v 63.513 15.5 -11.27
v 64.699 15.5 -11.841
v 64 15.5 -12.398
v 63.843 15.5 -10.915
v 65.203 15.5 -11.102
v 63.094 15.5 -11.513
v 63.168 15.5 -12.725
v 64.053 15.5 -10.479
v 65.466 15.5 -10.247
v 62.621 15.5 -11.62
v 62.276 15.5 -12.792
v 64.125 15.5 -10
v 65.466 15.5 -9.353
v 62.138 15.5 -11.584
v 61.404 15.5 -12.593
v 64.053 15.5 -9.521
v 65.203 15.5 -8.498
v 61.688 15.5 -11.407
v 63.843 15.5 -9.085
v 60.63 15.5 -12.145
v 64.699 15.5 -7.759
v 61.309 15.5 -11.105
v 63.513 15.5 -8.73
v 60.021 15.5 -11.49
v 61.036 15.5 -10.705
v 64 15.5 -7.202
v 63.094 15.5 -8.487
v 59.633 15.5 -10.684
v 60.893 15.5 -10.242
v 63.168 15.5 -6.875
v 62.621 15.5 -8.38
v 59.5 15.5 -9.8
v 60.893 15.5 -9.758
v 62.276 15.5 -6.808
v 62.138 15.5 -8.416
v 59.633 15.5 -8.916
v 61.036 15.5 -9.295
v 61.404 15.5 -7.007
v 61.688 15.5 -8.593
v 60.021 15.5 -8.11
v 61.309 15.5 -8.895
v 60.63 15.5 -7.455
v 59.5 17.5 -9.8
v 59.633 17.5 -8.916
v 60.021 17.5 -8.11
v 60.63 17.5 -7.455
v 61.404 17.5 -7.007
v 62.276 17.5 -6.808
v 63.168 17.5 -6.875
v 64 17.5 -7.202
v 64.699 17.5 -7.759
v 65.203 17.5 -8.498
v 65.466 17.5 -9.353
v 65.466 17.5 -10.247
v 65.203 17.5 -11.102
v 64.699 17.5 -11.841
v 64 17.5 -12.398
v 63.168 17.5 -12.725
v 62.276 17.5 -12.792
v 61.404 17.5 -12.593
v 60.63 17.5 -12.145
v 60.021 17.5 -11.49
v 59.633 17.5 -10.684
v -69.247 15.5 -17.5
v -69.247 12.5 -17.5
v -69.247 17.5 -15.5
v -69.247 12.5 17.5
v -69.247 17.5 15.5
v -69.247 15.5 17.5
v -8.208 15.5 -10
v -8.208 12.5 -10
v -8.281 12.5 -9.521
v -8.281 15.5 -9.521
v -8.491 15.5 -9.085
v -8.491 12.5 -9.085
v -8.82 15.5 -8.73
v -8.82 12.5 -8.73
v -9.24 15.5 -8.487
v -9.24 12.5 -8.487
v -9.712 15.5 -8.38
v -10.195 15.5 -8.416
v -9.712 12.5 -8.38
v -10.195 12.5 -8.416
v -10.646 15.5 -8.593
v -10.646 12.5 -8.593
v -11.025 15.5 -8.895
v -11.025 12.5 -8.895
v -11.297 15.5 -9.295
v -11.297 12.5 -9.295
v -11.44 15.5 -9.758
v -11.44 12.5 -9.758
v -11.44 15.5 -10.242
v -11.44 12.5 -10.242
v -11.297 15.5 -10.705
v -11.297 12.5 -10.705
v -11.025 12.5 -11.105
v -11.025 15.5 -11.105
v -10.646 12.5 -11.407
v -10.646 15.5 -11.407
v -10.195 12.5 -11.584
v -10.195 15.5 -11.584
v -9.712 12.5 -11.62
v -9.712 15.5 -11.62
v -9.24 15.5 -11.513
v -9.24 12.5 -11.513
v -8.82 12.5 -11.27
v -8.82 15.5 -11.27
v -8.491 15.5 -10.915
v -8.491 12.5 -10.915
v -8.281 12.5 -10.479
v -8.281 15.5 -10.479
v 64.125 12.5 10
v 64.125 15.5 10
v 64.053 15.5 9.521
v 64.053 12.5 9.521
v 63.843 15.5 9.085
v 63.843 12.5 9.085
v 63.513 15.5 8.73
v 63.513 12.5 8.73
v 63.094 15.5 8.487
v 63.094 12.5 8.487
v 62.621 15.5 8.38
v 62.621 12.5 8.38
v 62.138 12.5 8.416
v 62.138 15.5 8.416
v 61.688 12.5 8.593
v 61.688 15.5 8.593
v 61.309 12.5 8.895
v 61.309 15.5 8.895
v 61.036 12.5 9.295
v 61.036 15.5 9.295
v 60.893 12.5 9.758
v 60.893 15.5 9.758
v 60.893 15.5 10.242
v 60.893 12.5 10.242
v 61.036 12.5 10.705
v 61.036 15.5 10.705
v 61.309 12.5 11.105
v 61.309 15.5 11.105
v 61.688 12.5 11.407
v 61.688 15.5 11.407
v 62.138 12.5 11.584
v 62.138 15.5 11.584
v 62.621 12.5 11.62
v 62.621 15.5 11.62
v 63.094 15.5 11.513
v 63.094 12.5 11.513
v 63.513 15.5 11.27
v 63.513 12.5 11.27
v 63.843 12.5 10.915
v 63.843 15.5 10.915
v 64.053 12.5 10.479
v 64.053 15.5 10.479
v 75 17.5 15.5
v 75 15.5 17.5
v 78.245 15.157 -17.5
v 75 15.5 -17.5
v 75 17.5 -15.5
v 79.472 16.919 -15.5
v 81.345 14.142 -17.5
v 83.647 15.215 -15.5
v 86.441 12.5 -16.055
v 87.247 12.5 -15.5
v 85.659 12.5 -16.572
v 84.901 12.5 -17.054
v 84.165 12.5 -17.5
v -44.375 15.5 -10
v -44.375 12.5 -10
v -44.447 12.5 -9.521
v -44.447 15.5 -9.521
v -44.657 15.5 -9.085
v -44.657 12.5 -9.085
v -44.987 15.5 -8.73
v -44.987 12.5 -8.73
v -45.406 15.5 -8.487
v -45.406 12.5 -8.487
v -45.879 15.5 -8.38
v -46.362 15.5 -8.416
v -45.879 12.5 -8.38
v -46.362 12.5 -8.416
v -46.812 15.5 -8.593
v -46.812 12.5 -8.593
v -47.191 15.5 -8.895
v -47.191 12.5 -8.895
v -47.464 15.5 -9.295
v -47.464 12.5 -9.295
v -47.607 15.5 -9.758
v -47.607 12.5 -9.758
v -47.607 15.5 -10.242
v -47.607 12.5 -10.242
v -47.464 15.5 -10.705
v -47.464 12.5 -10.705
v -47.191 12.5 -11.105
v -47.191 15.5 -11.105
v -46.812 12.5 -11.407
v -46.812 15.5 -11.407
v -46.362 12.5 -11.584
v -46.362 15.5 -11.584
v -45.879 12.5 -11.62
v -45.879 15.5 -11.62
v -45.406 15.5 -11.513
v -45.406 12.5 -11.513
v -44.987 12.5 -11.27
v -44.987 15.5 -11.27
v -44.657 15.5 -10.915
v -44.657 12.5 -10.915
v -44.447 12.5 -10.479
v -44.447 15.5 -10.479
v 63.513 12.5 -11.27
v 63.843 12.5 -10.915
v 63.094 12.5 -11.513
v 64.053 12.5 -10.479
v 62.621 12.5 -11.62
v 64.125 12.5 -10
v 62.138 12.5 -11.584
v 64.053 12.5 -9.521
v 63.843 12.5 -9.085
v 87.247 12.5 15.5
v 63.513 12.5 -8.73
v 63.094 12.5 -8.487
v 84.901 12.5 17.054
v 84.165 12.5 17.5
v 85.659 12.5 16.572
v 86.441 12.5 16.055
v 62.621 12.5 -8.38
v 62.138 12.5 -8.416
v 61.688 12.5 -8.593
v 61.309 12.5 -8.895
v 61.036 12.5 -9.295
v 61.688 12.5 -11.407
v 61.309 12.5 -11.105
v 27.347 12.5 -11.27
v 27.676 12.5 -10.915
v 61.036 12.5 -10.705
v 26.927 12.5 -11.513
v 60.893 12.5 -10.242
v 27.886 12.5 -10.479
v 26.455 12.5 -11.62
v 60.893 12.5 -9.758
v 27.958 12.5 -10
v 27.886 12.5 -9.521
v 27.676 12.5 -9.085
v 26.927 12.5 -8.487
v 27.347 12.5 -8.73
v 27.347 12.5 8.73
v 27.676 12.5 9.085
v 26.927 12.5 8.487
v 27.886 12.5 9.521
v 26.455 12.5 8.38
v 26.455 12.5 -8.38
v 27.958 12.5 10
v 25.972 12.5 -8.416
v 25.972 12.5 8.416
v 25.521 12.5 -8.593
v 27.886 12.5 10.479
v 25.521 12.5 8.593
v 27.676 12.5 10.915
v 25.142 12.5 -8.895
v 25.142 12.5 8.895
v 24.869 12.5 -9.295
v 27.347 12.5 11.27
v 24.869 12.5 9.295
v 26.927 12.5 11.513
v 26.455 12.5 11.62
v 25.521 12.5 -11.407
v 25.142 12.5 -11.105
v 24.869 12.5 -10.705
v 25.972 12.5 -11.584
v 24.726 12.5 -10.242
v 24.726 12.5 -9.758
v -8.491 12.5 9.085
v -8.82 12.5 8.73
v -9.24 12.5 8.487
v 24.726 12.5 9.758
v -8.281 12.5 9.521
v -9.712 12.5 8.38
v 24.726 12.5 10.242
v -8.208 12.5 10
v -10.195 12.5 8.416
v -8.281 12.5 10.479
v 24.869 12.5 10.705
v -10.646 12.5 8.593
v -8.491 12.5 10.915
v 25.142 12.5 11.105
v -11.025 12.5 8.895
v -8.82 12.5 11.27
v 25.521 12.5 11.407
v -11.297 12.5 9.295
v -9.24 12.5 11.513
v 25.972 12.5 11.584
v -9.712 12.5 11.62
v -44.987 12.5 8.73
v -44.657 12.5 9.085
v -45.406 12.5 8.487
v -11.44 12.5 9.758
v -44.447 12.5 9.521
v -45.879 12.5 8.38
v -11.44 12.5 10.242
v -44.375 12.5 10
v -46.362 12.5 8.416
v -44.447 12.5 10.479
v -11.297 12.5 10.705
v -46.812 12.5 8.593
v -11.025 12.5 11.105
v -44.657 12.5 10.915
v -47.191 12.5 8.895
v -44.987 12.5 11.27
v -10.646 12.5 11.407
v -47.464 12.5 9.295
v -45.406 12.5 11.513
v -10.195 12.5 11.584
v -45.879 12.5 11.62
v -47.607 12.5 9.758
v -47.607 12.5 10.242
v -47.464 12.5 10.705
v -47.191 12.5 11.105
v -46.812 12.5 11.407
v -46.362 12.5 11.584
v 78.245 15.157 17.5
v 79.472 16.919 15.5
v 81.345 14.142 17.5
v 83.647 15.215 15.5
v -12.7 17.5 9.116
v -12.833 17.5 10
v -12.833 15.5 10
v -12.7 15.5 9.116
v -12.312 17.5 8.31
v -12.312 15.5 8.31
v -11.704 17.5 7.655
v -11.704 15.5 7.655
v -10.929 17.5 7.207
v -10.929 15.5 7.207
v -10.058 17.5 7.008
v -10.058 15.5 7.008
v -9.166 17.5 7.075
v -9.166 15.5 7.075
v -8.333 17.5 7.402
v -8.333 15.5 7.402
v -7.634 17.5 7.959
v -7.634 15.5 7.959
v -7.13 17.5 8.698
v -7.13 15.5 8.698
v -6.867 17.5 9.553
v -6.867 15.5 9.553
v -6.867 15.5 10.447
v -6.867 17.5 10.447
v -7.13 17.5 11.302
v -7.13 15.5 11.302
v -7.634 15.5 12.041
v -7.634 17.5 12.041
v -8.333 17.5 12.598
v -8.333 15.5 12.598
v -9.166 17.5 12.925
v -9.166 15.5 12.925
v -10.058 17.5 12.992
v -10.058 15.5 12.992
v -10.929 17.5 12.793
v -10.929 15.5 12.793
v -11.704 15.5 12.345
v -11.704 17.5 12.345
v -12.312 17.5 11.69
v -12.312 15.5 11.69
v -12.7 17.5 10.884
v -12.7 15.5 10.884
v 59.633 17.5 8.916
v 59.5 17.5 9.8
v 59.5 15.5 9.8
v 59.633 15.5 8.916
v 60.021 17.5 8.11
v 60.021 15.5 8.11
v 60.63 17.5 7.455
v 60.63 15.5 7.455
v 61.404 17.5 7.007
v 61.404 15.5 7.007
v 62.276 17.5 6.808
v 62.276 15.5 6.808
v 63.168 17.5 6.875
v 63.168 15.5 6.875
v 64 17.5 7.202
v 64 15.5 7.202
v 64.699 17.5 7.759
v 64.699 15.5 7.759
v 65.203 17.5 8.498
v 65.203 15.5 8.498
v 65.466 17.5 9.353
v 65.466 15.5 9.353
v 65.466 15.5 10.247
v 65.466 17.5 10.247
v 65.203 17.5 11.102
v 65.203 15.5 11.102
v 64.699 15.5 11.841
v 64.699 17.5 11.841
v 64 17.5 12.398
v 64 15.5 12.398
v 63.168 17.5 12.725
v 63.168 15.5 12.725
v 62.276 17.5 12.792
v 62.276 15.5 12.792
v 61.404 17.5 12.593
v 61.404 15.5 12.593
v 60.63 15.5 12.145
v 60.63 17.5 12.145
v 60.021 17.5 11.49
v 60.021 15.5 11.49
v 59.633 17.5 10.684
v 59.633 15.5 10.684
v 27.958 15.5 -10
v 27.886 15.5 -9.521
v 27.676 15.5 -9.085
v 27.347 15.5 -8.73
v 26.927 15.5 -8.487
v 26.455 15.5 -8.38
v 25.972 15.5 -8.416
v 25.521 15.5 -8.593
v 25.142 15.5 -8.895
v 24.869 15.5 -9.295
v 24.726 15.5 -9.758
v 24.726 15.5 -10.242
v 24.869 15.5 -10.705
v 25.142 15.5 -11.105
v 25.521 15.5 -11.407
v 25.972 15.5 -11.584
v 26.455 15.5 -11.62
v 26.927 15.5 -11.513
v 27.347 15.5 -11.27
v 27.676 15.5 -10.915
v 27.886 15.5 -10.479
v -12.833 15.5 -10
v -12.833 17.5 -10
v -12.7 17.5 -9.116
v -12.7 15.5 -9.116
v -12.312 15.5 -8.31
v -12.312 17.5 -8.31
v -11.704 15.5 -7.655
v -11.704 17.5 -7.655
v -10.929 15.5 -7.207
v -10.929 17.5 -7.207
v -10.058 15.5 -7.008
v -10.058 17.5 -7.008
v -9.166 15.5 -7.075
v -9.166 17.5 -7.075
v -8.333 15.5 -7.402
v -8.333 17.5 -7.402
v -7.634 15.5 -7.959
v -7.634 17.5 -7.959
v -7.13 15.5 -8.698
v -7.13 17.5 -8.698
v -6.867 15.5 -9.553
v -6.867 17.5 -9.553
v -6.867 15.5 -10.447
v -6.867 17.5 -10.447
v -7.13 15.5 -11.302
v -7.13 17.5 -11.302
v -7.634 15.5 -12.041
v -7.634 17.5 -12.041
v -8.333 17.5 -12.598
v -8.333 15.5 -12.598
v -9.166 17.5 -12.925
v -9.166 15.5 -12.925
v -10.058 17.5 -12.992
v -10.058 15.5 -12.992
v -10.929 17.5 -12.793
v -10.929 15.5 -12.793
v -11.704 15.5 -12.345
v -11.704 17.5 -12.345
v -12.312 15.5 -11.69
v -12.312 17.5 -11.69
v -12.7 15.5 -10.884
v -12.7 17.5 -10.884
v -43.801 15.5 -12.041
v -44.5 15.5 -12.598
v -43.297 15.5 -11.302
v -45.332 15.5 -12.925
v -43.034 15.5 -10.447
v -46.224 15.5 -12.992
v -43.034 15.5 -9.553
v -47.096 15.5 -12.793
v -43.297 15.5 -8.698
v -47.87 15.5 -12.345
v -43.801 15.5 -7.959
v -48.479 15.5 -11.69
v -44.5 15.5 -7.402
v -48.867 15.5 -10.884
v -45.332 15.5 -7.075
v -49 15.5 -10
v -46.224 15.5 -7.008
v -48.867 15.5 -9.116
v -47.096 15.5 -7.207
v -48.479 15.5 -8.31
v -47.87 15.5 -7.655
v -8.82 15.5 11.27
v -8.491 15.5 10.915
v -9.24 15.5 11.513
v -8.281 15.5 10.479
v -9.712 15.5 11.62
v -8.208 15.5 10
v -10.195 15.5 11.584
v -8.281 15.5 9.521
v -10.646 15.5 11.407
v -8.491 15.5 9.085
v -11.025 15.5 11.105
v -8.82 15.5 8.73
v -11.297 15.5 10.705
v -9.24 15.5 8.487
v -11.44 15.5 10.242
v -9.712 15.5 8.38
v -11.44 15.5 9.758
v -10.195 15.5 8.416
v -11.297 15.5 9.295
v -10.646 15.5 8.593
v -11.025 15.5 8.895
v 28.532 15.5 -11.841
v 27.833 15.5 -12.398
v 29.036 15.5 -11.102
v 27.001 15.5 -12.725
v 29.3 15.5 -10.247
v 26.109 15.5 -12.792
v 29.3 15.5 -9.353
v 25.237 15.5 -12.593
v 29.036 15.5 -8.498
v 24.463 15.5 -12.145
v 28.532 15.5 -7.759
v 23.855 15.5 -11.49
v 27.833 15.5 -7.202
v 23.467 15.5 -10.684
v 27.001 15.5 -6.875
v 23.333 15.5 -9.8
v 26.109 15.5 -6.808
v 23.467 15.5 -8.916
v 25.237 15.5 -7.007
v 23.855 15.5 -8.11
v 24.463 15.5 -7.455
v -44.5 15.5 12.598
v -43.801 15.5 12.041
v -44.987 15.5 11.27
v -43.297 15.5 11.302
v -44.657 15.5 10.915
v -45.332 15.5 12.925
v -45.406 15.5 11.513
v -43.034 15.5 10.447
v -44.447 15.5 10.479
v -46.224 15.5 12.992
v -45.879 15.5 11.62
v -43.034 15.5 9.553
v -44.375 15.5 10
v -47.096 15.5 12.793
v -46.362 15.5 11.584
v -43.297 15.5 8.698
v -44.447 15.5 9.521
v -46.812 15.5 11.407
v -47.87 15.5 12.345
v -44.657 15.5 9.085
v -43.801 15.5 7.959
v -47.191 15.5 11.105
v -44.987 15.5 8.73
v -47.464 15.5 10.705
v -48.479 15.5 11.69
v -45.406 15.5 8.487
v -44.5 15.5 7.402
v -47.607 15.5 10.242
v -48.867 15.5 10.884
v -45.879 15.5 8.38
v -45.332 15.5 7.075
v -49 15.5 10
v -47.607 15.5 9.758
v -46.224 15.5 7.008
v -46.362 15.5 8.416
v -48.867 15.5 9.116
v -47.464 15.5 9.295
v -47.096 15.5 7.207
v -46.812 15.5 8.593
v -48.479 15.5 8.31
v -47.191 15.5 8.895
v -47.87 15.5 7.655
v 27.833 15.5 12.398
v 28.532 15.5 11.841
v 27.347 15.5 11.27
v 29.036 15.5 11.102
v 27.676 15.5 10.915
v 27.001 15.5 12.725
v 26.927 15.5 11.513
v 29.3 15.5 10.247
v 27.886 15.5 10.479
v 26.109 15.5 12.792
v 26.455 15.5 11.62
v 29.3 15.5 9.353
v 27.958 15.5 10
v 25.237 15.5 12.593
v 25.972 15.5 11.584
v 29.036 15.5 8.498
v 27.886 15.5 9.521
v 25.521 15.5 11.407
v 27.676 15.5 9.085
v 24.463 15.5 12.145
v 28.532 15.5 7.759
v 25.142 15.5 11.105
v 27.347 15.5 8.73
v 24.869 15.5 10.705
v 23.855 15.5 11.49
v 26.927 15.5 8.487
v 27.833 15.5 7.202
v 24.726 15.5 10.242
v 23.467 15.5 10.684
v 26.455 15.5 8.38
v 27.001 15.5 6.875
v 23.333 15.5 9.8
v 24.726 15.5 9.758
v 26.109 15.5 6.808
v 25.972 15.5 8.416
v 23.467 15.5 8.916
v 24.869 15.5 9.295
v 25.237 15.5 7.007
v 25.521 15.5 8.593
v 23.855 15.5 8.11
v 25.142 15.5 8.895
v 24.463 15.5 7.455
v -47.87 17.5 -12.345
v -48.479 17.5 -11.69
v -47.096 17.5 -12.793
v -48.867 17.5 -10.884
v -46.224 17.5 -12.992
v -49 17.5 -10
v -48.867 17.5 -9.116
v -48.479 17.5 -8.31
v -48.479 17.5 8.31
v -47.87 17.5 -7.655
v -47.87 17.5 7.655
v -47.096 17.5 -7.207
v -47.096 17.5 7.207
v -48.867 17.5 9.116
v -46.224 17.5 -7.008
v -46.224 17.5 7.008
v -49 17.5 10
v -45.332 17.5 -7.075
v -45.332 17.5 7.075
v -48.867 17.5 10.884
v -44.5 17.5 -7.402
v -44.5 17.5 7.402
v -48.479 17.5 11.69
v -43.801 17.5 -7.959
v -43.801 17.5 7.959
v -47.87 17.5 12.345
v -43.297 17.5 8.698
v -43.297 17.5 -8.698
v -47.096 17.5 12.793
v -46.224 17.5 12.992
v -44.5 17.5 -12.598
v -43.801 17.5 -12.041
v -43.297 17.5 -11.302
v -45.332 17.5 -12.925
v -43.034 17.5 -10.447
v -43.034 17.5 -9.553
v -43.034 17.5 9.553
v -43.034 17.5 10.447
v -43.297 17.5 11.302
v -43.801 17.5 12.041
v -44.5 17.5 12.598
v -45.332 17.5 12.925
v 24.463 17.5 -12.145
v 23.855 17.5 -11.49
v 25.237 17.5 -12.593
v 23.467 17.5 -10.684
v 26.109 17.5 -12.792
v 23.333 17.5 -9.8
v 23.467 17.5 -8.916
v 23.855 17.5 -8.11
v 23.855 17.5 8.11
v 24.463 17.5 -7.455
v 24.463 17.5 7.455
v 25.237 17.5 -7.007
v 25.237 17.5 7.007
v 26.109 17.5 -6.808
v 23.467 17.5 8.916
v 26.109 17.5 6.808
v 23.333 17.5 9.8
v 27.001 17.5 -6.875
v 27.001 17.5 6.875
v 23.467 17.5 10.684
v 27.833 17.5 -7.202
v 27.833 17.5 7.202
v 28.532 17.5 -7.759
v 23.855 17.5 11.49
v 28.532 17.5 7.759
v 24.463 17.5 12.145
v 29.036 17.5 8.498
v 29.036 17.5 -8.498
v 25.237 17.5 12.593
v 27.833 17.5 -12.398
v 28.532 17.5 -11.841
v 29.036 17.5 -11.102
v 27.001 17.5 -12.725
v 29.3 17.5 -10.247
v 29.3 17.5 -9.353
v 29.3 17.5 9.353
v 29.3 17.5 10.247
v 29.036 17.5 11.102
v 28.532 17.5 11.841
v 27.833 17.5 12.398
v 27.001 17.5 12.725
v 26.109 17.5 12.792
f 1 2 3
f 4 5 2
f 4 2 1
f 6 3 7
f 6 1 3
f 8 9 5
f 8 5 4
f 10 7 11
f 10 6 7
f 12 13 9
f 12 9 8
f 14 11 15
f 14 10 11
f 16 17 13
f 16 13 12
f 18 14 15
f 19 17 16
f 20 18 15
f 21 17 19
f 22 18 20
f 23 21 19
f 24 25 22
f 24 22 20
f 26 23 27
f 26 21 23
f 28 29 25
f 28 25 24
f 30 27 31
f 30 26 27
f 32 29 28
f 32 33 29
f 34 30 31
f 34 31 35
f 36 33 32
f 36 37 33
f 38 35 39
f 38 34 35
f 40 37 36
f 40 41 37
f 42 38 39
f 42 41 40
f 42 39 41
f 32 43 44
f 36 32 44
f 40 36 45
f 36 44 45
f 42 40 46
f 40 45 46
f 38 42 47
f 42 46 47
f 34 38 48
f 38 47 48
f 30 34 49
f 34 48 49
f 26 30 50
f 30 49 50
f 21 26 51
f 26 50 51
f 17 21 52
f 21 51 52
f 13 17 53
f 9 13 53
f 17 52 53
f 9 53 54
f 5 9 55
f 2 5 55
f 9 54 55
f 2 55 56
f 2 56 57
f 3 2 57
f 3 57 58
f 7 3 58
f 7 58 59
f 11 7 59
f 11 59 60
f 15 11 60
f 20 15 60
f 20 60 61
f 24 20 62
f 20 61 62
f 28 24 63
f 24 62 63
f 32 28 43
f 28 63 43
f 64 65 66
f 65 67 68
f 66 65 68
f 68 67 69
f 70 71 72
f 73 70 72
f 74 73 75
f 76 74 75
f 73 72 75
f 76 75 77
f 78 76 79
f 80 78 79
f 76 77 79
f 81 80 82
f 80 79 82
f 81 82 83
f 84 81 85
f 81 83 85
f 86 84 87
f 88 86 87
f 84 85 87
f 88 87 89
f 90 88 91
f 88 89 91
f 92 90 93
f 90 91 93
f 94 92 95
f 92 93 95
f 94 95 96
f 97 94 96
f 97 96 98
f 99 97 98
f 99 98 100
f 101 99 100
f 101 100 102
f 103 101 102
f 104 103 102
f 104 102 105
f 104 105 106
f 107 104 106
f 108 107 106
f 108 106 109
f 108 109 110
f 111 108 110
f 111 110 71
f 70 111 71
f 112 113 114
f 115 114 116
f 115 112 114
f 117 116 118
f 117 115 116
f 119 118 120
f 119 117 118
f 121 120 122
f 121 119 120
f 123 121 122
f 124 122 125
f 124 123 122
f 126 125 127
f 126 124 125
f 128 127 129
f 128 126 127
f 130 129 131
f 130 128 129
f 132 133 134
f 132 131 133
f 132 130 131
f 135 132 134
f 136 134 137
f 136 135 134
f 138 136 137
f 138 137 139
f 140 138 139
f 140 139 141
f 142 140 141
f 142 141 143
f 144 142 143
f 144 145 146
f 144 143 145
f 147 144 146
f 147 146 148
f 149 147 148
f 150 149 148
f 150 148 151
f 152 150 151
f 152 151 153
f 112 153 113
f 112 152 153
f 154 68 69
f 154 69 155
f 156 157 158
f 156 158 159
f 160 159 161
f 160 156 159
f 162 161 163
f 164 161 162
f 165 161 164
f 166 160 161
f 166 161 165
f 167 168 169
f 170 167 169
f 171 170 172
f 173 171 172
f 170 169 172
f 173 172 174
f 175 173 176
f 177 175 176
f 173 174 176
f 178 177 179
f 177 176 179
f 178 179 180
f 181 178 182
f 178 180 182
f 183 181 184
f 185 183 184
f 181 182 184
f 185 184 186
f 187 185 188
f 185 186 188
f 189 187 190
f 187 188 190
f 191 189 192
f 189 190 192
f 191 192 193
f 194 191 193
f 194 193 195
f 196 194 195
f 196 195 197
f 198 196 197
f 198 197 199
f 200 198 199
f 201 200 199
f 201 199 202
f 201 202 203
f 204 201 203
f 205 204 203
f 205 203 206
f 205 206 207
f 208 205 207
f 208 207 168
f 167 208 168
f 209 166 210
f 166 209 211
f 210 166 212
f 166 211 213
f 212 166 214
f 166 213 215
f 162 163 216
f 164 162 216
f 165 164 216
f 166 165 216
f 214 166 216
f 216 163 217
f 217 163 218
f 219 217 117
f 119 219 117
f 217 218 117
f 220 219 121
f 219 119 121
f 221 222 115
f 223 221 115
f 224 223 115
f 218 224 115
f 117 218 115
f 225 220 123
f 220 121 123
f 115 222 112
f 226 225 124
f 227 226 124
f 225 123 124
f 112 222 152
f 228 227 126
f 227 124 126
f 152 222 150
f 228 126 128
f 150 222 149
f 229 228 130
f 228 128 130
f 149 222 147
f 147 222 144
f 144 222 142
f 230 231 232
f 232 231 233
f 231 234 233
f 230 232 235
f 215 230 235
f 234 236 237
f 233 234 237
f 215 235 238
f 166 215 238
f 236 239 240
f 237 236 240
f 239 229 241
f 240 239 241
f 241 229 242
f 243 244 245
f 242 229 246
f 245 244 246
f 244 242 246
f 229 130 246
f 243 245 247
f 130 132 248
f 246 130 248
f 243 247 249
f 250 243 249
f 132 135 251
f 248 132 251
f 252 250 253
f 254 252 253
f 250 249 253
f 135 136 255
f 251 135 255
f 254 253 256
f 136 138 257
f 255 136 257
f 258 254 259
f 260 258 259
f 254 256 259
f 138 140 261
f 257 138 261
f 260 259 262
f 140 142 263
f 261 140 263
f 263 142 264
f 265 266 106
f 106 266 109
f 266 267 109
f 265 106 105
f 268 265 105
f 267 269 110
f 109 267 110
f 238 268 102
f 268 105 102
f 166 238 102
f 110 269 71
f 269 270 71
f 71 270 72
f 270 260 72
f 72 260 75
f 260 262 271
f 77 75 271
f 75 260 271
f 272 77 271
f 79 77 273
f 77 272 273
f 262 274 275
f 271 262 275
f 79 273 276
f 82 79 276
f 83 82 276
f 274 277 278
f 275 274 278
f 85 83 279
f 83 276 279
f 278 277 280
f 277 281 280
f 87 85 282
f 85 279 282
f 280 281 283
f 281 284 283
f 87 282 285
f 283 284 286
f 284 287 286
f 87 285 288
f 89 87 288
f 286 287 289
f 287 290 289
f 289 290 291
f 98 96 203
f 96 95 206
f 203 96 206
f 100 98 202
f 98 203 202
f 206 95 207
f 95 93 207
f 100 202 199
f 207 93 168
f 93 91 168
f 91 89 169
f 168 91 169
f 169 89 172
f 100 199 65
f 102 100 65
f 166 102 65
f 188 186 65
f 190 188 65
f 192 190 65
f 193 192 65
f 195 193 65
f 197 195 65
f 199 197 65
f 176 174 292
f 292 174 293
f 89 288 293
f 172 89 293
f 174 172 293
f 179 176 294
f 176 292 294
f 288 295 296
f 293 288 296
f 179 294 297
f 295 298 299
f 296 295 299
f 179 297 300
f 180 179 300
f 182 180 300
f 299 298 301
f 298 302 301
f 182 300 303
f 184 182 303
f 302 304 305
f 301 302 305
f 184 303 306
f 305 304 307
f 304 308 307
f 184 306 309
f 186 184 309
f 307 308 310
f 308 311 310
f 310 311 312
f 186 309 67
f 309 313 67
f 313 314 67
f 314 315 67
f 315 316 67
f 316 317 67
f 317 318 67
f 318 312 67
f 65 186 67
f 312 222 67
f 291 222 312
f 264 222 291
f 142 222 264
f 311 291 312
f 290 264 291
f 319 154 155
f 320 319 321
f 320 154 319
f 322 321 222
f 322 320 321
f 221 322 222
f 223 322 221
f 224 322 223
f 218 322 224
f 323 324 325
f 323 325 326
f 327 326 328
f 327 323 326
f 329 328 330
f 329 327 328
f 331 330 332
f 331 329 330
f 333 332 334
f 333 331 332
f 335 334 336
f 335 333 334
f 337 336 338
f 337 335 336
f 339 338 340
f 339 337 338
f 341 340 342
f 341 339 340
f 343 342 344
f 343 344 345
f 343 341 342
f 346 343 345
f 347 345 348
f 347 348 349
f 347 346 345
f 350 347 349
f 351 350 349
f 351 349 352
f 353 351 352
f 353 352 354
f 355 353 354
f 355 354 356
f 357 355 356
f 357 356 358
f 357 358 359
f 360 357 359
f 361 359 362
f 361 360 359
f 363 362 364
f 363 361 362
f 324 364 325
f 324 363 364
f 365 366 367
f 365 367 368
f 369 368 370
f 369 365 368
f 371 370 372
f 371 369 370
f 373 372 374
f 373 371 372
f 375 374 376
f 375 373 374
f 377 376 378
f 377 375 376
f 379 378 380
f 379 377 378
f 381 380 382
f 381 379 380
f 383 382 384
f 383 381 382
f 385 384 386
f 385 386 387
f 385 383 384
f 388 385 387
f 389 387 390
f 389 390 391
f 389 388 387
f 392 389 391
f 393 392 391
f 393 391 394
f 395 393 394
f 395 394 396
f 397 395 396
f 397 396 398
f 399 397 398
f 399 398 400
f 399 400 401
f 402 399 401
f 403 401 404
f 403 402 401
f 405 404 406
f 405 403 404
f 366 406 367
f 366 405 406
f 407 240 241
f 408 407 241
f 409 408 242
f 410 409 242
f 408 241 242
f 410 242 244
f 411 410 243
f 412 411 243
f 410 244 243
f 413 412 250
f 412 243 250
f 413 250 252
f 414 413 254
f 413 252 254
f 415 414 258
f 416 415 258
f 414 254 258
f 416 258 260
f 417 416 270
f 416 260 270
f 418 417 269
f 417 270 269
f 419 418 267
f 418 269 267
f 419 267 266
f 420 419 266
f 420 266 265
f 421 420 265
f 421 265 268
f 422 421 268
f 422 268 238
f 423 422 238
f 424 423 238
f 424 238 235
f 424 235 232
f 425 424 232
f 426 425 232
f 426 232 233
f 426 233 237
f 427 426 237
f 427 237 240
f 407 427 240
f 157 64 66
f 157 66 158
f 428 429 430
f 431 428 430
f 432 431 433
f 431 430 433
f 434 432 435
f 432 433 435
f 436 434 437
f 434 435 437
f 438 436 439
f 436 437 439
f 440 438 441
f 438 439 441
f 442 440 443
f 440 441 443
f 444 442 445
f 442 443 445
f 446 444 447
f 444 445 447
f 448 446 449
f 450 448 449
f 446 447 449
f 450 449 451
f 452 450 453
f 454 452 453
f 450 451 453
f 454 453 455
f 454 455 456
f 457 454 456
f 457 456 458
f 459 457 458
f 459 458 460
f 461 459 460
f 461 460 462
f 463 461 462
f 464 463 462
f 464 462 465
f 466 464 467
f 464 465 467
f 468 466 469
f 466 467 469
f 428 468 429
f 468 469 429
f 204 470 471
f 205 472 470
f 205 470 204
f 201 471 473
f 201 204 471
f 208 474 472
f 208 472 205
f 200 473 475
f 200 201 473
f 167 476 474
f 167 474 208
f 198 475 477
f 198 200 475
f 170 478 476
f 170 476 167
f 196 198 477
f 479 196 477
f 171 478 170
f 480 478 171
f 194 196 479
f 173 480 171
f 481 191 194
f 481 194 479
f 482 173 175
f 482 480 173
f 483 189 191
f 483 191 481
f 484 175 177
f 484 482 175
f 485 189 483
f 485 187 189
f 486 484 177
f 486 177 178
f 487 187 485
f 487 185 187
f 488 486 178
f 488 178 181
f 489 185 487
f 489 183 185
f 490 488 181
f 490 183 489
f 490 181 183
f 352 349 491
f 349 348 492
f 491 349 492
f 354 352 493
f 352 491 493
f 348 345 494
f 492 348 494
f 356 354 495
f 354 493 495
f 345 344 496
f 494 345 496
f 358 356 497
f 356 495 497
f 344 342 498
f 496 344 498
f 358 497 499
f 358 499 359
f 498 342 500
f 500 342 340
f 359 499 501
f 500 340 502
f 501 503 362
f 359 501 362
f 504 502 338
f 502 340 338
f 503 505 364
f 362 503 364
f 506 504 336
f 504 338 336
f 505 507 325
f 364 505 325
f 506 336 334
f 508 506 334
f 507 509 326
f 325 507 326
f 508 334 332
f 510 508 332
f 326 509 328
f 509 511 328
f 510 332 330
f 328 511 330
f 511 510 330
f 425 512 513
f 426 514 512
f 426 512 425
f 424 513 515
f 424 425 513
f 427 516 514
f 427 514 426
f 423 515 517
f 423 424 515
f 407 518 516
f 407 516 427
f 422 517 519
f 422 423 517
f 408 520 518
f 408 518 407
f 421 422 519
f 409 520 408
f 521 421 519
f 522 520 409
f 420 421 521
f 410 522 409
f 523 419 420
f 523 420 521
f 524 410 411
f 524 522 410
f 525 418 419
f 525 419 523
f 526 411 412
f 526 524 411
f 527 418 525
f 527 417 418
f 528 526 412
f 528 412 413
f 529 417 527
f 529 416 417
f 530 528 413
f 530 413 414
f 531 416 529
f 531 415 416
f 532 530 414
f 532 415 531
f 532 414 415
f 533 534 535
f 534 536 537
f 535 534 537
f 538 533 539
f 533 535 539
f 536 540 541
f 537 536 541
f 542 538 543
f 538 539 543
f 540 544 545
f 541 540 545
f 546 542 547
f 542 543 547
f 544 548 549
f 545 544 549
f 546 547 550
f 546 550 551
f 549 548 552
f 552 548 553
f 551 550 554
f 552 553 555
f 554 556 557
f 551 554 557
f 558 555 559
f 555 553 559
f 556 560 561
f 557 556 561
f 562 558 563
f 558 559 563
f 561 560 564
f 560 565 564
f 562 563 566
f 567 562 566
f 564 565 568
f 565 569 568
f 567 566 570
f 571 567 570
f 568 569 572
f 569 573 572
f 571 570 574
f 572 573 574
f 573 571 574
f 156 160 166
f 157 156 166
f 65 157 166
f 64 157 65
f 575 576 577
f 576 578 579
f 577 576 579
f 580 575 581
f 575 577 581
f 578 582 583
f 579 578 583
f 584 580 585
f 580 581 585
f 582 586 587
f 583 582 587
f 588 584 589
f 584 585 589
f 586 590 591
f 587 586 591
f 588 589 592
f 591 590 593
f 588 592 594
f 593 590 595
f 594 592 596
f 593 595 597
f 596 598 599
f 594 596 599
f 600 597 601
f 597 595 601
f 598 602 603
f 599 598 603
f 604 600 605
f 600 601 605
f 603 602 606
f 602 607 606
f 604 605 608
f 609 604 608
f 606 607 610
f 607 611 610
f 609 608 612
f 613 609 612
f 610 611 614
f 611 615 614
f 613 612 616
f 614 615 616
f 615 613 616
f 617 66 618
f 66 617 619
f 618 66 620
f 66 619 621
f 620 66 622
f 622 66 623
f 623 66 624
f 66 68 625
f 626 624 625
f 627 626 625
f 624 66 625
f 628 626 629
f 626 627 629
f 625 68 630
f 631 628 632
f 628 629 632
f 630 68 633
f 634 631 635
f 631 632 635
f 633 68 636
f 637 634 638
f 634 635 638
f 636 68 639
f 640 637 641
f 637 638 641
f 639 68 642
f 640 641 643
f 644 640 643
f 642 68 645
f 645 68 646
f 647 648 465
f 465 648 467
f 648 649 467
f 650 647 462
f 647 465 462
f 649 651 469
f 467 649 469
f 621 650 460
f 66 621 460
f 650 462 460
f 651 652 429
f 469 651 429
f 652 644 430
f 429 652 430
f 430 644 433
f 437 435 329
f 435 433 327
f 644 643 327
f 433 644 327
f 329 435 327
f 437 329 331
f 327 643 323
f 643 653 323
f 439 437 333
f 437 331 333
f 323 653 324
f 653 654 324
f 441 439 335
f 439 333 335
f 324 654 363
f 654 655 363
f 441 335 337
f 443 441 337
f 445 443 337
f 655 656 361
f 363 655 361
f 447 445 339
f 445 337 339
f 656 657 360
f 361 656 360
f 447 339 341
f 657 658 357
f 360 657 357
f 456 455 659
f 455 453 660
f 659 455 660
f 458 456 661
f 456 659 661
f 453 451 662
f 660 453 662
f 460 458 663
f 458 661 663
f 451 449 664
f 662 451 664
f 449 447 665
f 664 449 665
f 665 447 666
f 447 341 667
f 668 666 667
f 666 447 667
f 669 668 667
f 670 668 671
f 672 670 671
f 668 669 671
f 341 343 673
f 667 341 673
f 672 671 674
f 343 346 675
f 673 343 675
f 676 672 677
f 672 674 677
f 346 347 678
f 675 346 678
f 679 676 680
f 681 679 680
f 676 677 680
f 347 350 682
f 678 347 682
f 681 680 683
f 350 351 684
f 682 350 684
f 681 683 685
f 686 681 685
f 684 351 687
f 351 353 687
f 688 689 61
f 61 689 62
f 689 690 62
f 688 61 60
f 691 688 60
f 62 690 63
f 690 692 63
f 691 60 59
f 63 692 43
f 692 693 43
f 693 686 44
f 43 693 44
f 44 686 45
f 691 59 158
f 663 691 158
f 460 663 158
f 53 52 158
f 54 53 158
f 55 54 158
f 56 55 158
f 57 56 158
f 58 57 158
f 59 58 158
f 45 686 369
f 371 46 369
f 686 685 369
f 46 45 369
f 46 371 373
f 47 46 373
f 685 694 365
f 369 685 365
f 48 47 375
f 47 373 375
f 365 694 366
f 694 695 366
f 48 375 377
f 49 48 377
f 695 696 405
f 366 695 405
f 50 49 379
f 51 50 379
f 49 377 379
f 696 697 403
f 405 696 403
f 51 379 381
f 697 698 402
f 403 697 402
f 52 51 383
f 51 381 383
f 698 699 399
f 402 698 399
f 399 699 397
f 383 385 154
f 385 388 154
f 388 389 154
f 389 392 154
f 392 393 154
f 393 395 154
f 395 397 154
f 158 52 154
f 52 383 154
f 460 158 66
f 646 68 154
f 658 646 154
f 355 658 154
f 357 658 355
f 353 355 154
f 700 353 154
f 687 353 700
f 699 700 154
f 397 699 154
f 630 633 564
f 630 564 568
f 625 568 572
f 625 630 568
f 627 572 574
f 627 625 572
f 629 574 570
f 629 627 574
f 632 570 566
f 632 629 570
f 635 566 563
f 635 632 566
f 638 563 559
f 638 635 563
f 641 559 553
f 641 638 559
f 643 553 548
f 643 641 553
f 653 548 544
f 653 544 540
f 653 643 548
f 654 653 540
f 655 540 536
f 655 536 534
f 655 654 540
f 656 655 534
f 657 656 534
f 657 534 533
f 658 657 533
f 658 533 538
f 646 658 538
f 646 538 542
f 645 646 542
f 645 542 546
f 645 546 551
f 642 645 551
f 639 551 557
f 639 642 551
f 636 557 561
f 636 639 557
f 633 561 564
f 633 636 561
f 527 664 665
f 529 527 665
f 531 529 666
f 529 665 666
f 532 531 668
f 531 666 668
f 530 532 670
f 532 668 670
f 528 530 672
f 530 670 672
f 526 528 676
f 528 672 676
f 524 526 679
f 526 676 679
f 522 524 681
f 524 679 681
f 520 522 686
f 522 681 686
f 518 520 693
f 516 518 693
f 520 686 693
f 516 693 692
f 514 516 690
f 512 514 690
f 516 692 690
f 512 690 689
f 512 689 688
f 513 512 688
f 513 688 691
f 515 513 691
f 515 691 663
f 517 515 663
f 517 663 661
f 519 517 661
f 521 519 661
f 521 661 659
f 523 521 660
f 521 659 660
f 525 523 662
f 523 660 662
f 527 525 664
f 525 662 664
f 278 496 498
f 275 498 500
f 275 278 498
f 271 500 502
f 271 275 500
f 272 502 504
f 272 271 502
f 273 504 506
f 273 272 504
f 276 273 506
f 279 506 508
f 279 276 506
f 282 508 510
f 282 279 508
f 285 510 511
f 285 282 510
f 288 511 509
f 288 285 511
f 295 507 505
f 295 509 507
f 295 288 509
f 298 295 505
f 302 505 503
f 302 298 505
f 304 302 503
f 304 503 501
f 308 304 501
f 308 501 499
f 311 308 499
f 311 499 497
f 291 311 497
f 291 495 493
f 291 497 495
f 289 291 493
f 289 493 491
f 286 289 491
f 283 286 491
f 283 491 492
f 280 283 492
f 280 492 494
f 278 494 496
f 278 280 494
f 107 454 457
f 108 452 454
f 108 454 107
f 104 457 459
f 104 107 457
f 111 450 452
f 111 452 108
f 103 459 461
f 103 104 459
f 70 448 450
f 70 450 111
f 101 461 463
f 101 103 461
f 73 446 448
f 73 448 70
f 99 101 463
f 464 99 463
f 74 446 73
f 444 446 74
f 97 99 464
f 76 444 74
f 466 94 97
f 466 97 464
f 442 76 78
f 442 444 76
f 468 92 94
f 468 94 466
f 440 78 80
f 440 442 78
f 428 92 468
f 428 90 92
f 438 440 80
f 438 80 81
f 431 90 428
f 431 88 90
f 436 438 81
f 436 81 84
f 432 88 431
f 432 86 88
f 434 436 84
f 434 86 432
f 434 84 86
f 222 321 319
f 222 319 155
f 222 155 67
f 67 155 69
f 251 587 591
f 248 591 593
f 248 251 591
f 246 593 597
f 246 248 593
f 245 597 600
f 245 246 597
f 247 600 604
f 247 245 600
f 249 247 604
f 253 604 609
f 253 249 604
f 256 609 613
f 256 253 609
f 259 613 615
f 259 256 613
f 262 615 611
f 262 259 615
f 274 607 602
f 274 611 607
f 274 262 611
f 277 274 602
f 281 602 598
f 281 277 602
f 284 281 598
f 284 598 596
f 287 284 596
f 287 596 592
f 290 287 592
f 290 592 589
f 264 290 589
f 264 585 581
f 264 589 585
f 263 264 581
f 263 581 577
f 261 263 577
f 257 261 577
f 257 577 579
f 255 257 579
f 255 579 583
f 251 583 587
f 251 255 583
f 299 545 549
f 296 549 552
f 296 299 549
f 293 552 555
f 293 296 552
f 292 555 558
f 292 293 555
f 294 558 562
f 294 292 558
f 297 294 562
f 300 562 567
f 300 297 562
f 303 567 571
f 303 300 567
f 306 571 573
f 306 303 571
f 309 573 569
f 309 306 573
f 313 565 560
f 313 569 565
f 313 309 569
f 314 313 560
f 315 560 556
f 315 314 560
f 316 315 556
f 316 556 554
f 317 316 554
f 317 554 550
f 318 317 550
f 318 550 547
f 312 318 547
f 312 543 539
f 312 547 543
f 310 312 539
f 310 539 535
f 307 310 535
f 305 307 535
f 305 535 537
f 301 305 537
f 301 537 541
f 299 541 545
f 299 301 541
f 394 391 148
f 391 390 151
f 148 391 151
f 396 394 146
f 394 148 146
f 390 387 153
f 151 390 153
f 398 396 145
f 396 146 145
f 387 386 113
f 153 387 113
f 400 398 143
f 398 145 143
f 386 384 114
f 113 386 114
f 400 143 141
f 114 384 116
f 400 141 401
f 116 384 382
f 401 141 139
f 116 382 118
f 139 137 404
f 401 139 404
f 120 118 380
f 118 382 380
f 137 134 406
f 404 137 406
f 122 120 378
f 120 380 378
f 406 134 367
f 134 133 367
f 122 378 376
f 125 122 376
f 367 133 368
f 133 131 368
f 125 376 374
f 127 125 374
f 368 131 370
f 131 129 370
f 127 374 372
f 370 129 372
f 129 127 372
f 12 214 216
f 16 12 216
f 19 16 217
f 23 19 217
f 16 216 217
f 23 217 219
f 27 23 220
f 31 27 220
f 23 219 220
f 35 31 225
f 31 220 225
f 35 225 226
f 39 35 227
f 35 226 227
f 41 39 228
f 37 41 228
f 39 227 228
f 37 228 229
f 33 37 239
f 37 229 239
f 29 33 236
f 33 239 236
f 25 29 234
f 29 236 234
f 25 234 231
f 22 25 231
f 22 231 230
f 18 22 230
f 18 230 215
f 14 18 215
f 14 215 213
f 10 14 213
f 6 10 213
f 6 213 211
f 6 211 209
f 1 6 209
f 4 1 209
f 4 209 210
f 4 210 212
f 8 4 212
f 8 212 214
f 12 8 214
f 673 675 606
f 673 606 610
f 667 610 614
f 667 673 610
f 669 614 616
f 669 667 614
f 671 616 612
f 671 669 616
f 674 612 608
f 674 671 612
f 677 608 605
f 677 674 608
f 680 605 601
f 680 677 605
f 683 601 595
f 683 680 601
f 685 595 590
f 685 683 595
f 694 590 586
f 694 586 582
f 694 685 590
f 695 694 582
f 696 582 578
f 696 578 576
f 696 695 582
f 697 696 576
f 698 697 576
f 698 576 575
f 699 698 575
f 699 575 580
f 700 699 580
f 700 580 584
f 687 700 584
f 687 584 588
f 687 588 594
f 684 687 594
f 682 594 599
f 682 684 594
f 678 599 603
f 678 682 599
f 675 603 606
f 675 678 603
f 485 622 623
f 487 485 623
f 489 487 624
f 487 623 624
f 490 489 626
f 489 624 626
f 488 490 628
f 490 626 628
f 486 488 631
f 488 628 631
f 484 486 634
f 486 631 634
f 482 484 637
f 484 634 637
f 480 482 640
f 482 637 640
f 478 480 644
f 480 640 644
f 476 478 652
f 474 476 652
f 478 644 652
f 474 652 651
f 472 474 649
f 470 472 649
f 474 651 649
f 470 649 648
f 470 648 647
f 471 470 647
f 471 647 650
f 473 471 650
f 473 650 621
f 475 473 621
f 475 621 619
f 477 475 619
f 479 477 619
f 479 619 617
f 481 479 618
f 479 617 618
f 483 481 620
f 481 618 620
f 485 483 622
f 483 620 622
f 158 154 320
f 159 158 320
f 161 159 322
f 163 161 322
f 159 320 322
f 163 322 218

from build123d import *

# Parameters (mm, degrees)
BOSS_EXTRUDE1_DEPTH = 17.5
SKETCH2_W           = 18
SKETCH2_H           = 5
CUT_EXTRUDE1_DEPTH  = 17.5
SKETCH3_R           = 1.625
CUT_EXTRUDE2_DEPTH  = 5
SKETCH4_R           = 3
CUT_EXTRUDE3_DEPTH  = 2
CHAMFER1_SIZE       = 2


with BuildPart() as part:
    # Sketch1 → Boss-Extrude1 (new, symmetric)
    with BuildSketch(Plane.XY):
        with BuildLine():
            Line((-75, 17.5), (75, 17.5))
            ThreePointArc((75, 17.5), (81.614378278, 16.201851746), (87.247448714, 12.5))
            Line((87.247448714, 12.5), (-87.247448714, 12.5))
            ThreePointArc((-87.247448714, 12.5), (-81.614378278, 16.201851746), (-75, 17.5))
        make_face()
    extrude(amount=BOSS_EXTRUDE1_DEPTH, both=True)

    # Sketch2 → Cut-Extrude1 (cut, symmetric)
    with BuildSketch(Plane.XY):
        with Locations((-78.247448714, 15)):
            Rectangle(SKETCH2_W, SKETCH2_H)
    extrude(amount=CUT_EXTRUDE1_DEPTH, both=True, mode=Mode.SUBTRACT)

    # Sketch3 → Cut-Extrude2 (cut)
    with BuildSketch(Plane.XZ.offset(-12.5)):
        with Locations((-46, -10)):
            Circle(SKETCH3_R)
        with Locations((-9.833333333, -10)):
            Circle(SKETCH3_R)
        with Locations((26.333333333, -10)):
            Circle(SKETCH3_R)
        with Locations((62.5, -10)):
            Circle(SKETCH3_R)
    cut_extrude2 = extrude(amount=-CUT_EXTRUDE2_DEPTH, mode=Mode.SUBTRACT)

    # Sketch4 → Cut-Extrude3 (cut)
    with BuildSketch(Plane(origin=(0, 17.5, 0), x_dir=(1, 0, 0), z_dir=(0, 1, 0))):
        with Locations(Location((62.5, 9.8, 0), (0, 0, 180))):
            Circle(SKETCH4_R)
        with Locations(Location((26.333333333, 9.8, 0), (0, 0, 180))):
            Circle(SKETCH4_R)
        with Locations(Location((-9.833333333, 10, 0), (0, 0, 180))):
            Circle(SKETCH4_R)
        with Locations(Location((-46, 10, 0), (0, 0, 180))):
            Circle(SKETCH4_R)
    cut_extrude3 = extrude(amount=-CUT_EXTRUDE3_DEPTH, mode=Mode.SUBTRACT)

    # Mirror1: Cut-Extrude2, Cut-Extrude3 across plane
    add(cut_extrude2.mirror(Plane.XY), mode=Mode.SUBTRACT)
    add(cut_extrude3.mirror(Plane.XY), mode=Mode.SUBTRACT)

    # Chamfer1
    chamfer1_edges = [part.edges().sort_by_distance(p)[0] for p in [
        (81.614378278, 16.201851746, 17.5),
        (2.876275643, 17.5, 17.5),
        (2.876275643, 17.5, -17.5),
        (81.614378278, 16.201851746, -17.5),
    ]]
    chamfer(chamfer1_edges, length=CHAMFER1_SIZE)


solid = part.part
